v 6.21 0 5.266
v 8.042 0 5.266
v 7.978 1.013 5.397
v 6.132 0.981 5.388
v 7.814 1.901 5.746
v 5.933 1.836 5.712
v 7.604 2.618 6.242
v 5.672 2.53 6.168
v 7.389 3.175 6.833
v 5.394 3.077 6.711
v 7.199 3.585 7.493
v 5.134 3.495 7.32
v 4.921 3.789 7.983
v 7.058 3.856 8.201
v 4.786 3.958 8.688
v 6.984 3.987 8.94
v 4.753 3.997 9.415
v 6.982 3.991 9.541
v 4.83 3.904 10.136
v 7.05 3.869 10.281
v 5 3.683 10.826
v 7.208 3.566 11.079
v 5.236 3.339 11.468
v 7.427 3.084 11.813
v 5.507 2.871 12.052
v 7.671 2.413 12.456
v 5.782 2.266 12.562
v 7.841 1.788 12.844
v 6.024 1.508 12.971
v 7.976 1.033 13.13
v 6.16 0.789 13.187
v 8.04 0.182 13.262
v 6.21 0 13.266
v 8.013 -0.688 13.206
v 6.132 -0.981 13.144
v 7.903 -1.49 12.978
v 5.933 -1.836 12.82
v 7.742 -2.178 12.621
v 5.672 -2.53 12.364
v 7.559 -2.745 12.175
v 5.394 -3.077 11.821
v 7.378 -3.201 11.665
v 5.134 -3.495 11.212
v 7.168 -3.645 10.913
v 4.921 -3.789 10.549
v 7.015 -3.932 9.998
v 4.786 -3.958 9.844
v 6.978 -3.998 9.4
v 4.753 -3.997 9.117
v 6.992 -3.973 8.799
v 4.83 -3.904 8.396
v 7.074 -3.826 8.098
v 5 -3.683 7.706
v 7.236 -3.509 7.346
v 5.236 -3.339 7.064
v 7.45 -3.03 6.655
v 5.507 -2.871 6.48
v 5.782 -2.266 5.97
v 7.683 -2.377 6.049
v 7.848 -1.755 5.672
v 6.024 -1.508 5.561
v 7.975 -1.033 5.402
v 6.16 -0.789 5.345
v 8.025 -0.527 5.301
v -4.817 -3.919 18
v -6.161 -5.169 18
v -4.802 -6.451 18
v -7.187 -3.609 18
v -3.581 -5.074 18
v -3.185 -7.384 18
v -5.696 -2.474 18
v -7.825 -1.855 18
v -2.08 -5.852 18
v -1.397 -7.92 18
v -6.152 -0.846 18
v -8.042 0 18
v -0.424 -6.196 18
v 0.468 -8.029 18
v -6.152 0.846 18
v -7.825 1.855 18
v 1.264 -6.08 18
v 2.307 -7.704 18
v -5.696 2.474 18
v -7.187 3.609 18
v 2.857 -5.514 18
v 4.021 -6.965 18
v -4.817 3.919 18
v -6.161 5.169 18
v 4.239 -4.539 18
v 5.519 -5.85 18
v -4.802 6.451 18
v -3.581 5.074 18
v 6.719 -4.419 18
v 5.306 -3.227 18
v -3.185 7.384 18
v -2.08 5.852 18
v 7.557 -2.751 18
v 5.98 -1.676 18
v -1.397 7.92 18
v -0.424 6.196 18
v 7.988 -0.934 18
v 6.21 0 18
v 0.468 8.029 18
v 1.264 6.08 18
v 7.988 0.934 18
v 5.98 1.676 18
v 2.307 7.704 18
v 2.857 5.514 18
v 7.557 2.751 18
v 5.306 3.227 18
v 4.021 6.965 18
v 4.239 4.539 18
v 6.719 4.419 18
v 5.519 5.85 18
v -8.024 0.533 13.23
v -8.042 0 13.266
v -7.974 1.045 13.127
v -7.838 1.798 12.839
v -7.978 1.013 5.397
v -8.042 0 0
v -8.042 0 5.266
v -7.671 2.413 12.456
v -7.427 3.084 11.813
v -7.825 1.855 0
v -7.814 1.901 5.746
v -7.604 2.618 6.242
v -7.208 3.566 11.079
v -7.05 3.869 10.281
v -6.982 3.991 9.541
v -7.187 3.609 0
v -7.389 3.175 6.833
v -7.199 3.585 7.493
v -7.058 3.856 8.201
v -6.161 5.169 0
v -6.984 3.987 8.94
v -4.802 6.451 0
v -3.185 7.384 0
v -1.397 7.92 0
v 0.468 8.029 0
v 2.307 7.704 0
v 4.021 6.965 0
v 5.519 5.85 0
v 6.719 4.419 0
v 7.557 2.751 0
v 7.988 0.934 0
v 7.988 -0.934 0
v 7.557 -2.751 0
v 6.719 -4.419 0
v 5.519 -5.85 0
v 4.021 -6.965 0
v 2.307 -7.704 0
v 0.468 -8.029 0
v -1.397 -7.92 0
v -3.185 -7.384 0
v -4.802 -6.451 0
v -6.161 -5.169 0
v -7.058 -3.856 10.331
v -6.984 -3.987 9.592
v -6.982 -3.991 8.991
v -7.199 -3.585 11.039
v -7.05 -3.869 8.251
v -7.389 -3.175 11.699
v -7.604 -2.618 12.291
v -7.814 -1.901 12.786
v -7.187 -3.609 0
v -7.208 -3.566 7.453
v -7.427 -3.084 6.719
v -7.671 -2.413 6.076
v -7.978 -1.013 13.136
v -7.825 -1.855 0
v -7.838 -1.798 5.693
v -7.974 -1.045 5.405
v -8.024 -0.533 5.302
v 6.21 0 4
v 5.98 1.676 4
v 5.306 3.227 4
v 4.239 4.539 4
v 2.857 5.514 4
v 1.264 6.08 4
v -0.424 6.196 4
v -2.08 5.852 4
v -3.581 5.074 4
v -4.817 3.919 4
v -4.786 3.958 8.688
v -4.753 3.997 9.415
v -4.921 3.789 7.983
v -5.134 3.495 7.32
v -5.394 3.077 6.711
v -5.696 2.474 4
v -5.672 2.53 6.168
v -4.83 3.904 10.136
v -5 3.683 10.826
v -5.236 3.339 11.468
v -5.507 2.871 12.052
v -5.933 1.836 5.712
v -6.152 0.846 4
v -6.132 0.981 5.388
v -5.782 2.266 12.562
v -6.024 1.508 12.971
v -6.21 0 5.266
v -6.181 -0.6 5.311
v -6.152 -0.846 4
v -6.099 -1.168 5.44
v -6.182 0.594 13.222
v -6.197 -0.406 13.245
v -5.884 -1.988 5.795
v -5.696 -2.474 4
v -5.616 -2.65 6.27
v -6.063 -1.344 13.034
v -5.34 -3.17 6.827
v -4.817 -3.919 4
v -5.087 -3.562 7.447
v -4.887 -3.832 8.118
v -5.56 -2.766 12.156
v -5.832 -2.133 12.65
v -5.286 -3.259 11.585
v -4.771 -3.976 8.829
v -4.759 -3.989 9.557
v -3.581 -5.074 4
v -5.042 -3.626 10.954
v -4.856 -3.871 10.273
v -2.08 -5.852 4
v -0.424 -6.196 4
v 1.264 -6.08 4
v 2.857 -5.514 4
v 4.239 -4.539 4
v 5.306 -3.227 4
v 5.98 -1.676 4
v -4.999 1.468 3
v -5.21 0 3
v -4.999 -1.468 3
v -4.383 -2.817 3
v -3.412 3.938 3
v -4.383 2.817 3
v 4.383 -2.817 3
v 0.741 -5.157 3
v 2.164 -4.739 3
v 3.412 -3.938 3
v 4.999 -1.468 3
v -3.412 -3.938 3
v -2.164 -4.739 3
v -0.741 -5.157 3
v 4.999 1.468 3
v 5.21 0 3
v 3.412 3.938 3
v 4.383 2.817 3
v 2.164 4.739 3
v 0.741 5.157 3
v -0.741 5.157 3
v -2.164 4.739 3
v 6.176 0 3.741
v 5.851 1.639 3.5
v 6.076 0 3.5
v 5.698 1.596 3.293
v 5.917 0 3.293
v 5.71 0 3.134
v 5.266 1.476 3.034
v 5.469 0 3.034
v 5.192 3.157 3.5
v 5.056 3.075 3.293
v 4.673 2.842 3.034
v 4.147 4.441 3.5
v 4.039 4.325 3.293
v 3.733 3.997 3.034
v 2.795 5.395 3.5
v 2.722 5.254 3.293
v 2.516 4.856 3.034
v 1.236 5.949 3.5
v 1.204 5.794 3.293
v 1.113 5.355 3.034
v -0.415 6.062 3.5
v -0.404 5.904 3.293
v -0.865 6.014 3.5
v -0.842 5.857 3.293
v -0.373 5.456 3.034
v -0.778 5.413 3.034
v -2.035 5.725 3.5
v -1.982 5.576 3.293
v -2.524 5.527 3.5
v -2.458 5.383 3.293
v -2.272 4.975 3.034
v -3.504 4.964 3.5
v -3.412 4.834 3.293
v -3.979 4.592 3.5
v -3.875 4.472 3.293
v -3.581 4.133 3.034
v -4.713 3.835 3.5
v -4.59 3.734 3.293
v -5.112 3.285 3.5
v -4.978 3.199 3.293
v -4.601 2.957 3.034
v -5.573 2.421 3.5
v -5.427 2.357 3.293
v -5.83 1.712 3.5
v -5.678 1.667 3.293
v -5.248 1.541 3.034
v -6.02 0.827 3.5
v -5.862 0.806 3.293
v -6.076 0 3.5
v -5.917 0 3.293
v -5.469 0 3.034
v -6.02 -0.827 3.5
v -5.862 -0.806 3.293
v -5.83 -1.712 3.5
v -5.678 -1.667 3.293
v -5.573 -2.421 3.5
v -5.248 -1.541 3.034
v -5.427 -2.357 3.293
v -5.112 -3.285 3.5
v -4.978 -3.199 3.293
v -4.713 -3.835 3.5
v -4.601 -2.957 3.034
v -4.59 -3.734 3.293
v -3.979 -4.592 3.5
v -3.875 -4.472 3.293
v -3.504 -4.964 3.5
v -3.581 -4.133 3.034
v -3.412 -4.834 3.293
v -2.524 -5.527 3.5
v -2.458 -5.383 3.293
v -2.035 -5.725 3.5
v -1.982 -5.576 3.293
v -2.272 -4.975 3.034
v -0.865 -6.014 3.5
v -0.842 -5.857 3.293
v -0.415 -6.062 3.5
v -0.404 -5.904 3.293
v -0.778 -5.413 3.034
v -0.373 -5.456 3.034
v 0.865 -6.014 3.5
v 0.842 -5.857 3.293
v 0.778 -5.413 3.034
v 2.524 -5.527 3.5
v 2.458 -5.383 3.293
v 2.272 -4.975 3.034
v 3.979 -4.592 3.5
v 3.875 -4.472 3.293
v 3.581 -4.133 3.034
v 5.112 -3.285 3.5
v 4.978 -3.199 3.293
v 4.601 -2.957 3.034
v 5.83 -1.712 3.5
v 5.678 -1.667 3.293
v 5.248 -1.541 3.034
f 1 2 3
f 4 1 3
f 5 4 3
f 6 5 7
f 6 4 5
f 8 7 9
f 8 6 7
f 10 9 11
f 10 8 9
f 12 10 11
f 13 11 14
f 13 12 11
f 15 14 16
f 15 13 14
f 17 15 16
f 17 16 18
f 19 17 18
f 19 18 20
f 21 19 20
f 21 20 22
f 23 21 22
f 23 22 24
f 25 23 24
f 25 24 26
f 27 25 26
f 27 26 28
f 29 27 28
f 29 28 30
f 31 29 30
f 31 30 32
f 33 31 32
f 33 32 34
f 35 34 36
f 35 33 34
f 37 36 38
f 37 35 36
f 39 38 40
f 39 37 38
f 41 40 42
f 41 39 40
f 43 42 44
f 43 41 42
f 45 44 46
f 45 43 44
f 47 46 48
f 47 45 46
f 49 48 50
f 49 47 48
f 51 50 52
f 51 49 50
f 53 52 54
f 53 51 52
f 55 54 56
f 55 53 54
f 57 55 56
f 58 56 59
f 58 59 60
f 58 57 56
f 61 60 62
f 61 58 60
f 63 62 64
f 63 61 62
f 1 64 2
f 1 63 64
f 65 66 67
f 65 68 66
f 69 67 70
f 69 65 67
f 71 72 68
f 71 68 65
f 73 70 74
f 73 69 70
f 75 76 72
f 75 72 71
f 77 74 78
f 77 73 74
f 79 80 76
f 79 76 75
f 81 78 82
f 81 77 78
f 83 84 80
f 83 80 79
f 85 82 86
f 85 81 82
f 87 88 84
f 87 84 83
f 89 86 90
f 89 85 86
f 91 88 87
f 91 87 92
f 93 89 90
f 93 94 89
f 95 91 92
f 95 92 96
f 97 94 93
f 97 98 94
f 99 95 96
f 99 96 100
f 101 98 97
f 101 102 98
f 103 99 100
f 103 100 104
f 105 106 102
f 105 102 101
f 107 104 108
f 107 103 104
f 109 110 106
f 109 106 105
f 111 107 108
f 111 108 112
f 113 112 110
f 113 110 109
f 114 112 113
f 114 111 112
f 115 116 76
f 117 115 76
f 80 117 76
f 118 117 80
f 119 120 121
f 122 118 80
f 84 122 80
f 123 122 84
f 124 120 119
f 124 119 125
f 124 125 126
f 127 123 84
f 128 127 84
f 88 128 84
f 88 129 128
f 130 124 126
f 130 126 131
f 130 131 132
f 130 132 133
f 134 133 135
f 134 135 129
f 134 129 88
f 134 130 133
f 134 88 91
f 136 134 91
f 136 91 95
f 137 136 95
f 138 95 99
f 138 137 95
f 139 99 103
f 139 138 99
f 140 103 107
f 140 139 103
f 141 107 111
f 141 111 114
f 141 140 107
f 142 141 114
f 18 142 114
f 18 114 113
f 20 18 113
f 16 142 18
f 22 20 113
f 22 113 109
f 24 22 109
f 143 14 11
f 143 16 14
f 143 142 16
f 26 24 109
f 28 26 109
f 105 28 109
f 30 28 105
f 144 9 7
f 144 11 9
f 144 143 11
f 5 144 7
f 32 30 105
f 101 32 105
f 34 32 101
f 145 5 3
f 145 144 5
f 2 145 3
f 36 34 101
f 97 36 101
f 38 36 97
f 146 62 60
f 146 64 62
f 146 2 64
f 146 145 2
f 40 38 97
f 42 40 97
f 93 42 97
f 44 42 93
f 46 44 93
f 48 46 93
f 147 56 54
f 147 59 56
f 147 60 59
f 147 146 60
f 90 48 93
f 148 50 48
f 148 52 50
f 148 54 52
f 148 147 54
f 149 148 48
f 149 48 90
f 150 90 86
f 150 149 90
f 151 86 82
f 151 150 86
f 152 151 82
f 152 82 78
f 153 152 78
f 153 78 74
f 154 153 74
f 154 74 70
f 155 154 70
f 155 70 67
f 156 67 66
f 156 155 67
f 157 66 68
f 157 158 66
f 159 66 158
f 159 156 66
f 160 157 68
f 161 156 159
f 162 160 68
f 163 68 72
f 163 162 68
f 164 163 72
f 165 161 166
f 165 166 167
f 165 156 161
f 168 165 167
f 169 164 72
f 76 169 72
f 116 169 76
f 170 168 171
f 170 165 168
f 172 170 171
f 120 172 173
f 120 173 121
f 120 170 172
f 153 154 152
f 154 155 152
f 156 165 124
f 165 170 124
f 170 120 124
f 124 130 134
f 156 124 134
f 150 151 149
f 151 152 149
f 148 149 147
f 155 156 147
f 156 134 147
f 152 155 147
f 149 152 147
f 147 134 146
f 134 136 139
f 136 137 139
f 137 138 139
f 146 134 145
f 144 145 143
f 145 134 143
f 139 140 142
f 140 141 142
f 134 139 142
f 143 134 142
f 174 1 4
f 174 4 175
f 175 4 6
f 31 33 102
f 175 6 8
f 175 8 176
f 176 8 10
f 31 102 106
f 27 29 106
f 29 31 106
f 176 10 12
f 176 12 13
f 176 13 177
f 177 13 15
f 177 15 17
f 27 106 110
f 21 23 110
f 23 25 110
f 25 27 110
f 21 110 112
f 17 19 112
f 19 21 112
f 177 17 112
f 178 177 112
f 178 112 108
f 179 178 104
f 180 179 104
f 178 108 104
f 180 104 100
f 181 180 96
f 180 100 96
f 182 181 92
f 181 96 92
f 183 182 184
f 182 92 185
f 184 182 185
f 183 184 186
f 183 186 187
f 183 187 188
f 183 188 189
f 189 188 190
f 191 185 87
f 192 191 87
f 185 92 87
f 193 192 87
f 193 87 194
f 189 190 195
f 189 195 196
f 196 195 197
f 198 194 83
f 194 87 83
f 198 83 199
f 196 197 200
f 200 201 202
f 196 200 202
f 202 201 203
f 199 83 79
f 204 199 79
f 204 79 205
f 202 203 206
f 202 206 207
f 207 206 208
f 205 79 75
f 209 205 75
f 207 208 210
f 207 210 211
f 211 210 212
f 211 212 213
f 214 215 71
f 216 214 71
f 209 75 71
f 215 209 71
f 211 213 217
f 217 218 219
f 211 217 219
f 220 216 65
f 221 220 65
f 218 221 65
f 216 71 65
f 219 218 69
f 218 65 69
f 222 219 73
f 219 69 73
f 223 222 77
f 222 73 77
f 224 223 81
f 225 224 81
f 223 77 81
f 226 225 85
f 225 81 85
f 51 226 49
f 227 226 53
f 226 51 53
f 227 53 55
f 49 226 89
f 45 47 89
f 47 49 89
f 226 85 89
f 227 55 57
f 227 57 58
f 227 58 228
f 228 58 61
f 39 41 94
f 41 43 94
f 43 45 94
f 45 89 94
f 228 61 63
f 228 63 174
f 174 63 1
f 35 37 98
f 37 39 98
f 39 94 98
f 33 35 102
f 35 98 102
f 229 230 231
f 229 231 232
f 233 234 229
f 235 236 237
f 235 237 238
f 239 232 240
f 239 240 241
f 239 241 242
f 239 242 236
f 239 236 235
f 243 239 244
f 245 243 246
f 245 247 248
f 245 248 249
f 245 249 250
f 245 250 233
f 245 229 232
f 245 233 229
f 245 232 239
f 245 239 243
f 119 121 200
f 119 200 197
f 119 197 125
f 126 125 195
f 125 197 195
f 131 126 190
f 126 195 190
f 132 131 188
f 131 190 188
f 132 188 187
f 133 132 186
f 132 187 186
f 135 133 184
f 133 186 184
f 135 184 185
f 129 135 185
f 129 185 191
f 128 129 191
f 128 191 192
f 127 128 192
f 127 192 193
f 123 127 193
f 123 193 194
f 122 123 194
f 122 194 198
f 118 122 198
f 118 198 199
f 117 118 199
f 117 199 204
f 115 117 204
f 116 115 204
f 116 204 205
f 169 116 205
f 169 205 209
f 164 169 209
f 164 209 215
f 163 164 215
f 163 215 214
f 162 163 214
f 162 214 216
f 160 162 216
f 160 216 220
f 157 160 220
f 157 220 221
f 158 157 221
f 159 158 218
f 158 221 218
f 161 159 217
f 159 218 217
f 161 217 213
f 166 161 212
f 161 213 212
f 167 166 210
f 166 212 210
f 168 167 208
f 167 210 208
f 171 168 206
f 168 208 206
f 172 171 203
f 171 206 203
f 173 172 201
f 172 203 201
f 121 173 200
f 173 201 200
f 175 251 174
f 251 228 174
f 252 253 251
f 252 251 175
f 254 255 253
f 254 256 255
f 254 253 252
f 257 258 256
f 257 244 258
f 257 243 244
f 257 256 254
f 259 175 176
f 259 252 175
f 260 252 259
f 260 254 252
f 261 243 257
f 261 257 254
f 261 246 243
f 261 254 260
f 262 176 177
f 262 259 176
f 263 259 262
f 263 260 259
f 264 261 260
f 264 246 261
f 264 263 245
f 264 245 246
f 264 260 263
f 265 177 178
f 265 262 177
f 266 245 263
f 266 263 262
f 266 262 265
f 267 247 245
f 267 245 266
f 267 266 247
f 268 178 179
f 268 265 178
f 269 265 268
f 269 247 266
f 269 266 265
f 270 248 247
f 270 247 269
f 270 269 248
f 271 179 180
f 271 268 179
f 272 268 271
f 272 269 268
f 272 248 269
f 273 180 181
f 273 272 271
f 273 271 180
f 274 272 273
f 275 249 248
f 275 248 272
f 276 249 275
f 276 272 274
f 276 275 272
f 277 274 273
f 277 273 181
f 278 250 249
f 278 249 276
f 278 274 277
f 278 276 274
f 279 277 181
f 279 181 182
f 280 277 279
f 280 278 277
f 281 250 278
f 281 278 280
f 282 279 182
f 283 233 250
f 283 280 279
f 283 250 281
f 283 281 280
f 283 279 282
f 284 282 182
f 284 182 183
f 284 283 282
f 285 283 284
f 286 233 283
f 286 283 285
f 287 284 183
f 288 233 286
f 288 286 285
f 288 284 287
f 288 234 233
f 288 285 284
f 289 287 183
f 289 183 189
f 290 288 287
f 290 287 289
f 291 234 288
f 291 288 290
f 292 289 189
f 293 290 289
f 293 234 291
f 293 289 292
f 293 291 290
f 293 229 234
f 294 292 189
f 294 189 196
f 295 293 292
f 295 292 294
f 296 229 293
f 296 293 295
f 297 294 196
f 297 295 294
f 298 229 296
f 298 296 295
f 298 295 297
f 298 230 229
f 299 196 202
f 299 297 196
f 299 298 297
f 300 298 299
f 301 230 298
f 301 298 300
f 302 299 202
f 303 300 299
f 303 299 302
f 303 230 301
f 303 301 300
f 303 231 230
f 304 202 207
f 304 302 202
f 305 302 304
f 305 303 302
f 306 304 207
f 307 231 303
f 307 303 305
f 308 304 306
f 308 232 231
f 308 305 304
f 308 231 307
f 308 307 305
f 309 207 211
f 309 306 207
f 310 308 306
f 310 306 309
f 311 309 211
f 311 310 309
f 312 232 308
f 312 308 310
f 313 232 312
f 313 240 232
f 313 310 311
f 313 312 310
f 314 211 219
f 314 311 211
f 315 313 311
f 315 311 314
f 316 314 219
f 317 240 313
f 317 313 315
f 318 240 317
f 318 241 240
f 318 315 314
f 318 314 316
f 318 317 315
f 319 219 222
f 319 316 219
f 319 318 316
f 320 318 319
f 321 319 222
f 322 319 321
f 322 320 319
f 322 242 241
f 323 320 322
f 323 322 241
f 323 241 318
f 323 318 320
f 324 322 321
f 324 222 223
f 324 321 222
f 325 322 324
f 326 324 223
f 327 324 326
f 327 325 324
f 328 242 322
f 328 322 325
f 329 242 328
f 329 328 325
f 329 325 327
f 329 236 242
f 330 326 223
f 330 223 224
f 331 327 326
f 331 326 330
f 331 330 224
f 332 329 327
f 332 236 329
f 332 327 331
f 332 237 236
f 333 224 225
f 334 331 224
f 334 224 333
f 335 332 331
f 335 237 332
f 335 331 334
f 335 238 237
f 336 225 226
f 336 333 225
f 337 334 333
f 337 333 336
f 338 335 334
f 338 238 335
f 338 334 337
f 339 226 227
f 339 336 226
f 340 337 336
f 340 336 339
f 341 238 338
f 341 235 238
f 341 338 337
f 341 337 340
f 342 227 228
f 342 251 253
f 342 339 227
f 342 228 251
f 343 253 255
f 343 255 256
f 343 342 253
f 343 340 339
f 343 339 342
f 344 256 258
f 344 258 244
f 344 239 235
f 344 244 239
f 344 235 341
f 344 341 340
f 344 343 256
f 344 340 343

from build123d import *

# Parameters (mm, degrees)
SKETCH2_R               = 10
BOSS_EXTRUDE1_DEPTH     = 18
SKETCH5_R               = 4
CUT_EXTRUDE1_DEPTH      = 18
CUT_EXTRUDE1_DEPTH_BACK = 21
SKETCH6_OUTSIDE_W       = 28.706
SKETCH6_OUTSIDE_H       = 28.706
SKETCH6_OUTSIDE_R       = 8.042126696
CUT_EXTRUDE2_DEPTH      = 24
SKETCH8_R               = 6.210271538
CUT_EXTRUDE4_DEPTH      = 15
FILLET1_R               = 1


with BuildPart() as part:
    # Sketch2 → Boss-Extrude1 (new body)
    with BuildSketch(Plane.XY):
        Circle(SKETCH2_R)
    extrude(amount=BOSS_EXTRUDE1_DEPTH)

    # Sketch5 → Cut-Extrude1 (cut, two sides)
    with BuildSketch(Plane(origin=(0, 0, 0), x_dir=(0, 0, -1), z_dir=(1, 0, 0))) as cut_extrude1_sk:
        with Locations((-9.266027008, 0)):
            Circle(SKETCH5_R)
    extrude(amount=CUT_EXTRUDE1_DEPTH, mode=Mode.SUBTRACT)
    extrude(cut_extrude1_sk.sketch, amount=-CUT_EXTRUDE1_DEPTH_BACK, mode=Mode.SUBTRACT)

    # Sketch6 outside → Cut-Extrude2 (cut)
    with BuildSketch(Plane(origin=(0, 0, 0), x_dir=(-1, 0, 0), z_dir=(0, 0, -1))):
        Rectangle(SKETCH6_OUTSIDE_W, SKETCH6_OUTSIDE_H)
        Circle(SKETCH6_OUTSIDE_R, mode=Mode.SUBTRACT)
    extrude(amount=-CUT_EXTRUDE2_DEPTH, mode=Mode.SUBTRACT)

    # Sketch8 → Cut-Extrude4 (cut)
    with BuildSketch(Plane.XY.offset(18)):
        Circle(SKETCH8_R)
    extrude(amount=-CUT_EXTRUDE4_DEPTH, mode=Mode.SUBTRACT)

    # Fillet1
    fillet1_edges = [part.edges().sort_by_distance(p)[0] for p in [
        (-6.210271538, 0, 3),
    ]]
    fillet(fillet1_edges, radius=FILLET1_R)


solid = part.part
